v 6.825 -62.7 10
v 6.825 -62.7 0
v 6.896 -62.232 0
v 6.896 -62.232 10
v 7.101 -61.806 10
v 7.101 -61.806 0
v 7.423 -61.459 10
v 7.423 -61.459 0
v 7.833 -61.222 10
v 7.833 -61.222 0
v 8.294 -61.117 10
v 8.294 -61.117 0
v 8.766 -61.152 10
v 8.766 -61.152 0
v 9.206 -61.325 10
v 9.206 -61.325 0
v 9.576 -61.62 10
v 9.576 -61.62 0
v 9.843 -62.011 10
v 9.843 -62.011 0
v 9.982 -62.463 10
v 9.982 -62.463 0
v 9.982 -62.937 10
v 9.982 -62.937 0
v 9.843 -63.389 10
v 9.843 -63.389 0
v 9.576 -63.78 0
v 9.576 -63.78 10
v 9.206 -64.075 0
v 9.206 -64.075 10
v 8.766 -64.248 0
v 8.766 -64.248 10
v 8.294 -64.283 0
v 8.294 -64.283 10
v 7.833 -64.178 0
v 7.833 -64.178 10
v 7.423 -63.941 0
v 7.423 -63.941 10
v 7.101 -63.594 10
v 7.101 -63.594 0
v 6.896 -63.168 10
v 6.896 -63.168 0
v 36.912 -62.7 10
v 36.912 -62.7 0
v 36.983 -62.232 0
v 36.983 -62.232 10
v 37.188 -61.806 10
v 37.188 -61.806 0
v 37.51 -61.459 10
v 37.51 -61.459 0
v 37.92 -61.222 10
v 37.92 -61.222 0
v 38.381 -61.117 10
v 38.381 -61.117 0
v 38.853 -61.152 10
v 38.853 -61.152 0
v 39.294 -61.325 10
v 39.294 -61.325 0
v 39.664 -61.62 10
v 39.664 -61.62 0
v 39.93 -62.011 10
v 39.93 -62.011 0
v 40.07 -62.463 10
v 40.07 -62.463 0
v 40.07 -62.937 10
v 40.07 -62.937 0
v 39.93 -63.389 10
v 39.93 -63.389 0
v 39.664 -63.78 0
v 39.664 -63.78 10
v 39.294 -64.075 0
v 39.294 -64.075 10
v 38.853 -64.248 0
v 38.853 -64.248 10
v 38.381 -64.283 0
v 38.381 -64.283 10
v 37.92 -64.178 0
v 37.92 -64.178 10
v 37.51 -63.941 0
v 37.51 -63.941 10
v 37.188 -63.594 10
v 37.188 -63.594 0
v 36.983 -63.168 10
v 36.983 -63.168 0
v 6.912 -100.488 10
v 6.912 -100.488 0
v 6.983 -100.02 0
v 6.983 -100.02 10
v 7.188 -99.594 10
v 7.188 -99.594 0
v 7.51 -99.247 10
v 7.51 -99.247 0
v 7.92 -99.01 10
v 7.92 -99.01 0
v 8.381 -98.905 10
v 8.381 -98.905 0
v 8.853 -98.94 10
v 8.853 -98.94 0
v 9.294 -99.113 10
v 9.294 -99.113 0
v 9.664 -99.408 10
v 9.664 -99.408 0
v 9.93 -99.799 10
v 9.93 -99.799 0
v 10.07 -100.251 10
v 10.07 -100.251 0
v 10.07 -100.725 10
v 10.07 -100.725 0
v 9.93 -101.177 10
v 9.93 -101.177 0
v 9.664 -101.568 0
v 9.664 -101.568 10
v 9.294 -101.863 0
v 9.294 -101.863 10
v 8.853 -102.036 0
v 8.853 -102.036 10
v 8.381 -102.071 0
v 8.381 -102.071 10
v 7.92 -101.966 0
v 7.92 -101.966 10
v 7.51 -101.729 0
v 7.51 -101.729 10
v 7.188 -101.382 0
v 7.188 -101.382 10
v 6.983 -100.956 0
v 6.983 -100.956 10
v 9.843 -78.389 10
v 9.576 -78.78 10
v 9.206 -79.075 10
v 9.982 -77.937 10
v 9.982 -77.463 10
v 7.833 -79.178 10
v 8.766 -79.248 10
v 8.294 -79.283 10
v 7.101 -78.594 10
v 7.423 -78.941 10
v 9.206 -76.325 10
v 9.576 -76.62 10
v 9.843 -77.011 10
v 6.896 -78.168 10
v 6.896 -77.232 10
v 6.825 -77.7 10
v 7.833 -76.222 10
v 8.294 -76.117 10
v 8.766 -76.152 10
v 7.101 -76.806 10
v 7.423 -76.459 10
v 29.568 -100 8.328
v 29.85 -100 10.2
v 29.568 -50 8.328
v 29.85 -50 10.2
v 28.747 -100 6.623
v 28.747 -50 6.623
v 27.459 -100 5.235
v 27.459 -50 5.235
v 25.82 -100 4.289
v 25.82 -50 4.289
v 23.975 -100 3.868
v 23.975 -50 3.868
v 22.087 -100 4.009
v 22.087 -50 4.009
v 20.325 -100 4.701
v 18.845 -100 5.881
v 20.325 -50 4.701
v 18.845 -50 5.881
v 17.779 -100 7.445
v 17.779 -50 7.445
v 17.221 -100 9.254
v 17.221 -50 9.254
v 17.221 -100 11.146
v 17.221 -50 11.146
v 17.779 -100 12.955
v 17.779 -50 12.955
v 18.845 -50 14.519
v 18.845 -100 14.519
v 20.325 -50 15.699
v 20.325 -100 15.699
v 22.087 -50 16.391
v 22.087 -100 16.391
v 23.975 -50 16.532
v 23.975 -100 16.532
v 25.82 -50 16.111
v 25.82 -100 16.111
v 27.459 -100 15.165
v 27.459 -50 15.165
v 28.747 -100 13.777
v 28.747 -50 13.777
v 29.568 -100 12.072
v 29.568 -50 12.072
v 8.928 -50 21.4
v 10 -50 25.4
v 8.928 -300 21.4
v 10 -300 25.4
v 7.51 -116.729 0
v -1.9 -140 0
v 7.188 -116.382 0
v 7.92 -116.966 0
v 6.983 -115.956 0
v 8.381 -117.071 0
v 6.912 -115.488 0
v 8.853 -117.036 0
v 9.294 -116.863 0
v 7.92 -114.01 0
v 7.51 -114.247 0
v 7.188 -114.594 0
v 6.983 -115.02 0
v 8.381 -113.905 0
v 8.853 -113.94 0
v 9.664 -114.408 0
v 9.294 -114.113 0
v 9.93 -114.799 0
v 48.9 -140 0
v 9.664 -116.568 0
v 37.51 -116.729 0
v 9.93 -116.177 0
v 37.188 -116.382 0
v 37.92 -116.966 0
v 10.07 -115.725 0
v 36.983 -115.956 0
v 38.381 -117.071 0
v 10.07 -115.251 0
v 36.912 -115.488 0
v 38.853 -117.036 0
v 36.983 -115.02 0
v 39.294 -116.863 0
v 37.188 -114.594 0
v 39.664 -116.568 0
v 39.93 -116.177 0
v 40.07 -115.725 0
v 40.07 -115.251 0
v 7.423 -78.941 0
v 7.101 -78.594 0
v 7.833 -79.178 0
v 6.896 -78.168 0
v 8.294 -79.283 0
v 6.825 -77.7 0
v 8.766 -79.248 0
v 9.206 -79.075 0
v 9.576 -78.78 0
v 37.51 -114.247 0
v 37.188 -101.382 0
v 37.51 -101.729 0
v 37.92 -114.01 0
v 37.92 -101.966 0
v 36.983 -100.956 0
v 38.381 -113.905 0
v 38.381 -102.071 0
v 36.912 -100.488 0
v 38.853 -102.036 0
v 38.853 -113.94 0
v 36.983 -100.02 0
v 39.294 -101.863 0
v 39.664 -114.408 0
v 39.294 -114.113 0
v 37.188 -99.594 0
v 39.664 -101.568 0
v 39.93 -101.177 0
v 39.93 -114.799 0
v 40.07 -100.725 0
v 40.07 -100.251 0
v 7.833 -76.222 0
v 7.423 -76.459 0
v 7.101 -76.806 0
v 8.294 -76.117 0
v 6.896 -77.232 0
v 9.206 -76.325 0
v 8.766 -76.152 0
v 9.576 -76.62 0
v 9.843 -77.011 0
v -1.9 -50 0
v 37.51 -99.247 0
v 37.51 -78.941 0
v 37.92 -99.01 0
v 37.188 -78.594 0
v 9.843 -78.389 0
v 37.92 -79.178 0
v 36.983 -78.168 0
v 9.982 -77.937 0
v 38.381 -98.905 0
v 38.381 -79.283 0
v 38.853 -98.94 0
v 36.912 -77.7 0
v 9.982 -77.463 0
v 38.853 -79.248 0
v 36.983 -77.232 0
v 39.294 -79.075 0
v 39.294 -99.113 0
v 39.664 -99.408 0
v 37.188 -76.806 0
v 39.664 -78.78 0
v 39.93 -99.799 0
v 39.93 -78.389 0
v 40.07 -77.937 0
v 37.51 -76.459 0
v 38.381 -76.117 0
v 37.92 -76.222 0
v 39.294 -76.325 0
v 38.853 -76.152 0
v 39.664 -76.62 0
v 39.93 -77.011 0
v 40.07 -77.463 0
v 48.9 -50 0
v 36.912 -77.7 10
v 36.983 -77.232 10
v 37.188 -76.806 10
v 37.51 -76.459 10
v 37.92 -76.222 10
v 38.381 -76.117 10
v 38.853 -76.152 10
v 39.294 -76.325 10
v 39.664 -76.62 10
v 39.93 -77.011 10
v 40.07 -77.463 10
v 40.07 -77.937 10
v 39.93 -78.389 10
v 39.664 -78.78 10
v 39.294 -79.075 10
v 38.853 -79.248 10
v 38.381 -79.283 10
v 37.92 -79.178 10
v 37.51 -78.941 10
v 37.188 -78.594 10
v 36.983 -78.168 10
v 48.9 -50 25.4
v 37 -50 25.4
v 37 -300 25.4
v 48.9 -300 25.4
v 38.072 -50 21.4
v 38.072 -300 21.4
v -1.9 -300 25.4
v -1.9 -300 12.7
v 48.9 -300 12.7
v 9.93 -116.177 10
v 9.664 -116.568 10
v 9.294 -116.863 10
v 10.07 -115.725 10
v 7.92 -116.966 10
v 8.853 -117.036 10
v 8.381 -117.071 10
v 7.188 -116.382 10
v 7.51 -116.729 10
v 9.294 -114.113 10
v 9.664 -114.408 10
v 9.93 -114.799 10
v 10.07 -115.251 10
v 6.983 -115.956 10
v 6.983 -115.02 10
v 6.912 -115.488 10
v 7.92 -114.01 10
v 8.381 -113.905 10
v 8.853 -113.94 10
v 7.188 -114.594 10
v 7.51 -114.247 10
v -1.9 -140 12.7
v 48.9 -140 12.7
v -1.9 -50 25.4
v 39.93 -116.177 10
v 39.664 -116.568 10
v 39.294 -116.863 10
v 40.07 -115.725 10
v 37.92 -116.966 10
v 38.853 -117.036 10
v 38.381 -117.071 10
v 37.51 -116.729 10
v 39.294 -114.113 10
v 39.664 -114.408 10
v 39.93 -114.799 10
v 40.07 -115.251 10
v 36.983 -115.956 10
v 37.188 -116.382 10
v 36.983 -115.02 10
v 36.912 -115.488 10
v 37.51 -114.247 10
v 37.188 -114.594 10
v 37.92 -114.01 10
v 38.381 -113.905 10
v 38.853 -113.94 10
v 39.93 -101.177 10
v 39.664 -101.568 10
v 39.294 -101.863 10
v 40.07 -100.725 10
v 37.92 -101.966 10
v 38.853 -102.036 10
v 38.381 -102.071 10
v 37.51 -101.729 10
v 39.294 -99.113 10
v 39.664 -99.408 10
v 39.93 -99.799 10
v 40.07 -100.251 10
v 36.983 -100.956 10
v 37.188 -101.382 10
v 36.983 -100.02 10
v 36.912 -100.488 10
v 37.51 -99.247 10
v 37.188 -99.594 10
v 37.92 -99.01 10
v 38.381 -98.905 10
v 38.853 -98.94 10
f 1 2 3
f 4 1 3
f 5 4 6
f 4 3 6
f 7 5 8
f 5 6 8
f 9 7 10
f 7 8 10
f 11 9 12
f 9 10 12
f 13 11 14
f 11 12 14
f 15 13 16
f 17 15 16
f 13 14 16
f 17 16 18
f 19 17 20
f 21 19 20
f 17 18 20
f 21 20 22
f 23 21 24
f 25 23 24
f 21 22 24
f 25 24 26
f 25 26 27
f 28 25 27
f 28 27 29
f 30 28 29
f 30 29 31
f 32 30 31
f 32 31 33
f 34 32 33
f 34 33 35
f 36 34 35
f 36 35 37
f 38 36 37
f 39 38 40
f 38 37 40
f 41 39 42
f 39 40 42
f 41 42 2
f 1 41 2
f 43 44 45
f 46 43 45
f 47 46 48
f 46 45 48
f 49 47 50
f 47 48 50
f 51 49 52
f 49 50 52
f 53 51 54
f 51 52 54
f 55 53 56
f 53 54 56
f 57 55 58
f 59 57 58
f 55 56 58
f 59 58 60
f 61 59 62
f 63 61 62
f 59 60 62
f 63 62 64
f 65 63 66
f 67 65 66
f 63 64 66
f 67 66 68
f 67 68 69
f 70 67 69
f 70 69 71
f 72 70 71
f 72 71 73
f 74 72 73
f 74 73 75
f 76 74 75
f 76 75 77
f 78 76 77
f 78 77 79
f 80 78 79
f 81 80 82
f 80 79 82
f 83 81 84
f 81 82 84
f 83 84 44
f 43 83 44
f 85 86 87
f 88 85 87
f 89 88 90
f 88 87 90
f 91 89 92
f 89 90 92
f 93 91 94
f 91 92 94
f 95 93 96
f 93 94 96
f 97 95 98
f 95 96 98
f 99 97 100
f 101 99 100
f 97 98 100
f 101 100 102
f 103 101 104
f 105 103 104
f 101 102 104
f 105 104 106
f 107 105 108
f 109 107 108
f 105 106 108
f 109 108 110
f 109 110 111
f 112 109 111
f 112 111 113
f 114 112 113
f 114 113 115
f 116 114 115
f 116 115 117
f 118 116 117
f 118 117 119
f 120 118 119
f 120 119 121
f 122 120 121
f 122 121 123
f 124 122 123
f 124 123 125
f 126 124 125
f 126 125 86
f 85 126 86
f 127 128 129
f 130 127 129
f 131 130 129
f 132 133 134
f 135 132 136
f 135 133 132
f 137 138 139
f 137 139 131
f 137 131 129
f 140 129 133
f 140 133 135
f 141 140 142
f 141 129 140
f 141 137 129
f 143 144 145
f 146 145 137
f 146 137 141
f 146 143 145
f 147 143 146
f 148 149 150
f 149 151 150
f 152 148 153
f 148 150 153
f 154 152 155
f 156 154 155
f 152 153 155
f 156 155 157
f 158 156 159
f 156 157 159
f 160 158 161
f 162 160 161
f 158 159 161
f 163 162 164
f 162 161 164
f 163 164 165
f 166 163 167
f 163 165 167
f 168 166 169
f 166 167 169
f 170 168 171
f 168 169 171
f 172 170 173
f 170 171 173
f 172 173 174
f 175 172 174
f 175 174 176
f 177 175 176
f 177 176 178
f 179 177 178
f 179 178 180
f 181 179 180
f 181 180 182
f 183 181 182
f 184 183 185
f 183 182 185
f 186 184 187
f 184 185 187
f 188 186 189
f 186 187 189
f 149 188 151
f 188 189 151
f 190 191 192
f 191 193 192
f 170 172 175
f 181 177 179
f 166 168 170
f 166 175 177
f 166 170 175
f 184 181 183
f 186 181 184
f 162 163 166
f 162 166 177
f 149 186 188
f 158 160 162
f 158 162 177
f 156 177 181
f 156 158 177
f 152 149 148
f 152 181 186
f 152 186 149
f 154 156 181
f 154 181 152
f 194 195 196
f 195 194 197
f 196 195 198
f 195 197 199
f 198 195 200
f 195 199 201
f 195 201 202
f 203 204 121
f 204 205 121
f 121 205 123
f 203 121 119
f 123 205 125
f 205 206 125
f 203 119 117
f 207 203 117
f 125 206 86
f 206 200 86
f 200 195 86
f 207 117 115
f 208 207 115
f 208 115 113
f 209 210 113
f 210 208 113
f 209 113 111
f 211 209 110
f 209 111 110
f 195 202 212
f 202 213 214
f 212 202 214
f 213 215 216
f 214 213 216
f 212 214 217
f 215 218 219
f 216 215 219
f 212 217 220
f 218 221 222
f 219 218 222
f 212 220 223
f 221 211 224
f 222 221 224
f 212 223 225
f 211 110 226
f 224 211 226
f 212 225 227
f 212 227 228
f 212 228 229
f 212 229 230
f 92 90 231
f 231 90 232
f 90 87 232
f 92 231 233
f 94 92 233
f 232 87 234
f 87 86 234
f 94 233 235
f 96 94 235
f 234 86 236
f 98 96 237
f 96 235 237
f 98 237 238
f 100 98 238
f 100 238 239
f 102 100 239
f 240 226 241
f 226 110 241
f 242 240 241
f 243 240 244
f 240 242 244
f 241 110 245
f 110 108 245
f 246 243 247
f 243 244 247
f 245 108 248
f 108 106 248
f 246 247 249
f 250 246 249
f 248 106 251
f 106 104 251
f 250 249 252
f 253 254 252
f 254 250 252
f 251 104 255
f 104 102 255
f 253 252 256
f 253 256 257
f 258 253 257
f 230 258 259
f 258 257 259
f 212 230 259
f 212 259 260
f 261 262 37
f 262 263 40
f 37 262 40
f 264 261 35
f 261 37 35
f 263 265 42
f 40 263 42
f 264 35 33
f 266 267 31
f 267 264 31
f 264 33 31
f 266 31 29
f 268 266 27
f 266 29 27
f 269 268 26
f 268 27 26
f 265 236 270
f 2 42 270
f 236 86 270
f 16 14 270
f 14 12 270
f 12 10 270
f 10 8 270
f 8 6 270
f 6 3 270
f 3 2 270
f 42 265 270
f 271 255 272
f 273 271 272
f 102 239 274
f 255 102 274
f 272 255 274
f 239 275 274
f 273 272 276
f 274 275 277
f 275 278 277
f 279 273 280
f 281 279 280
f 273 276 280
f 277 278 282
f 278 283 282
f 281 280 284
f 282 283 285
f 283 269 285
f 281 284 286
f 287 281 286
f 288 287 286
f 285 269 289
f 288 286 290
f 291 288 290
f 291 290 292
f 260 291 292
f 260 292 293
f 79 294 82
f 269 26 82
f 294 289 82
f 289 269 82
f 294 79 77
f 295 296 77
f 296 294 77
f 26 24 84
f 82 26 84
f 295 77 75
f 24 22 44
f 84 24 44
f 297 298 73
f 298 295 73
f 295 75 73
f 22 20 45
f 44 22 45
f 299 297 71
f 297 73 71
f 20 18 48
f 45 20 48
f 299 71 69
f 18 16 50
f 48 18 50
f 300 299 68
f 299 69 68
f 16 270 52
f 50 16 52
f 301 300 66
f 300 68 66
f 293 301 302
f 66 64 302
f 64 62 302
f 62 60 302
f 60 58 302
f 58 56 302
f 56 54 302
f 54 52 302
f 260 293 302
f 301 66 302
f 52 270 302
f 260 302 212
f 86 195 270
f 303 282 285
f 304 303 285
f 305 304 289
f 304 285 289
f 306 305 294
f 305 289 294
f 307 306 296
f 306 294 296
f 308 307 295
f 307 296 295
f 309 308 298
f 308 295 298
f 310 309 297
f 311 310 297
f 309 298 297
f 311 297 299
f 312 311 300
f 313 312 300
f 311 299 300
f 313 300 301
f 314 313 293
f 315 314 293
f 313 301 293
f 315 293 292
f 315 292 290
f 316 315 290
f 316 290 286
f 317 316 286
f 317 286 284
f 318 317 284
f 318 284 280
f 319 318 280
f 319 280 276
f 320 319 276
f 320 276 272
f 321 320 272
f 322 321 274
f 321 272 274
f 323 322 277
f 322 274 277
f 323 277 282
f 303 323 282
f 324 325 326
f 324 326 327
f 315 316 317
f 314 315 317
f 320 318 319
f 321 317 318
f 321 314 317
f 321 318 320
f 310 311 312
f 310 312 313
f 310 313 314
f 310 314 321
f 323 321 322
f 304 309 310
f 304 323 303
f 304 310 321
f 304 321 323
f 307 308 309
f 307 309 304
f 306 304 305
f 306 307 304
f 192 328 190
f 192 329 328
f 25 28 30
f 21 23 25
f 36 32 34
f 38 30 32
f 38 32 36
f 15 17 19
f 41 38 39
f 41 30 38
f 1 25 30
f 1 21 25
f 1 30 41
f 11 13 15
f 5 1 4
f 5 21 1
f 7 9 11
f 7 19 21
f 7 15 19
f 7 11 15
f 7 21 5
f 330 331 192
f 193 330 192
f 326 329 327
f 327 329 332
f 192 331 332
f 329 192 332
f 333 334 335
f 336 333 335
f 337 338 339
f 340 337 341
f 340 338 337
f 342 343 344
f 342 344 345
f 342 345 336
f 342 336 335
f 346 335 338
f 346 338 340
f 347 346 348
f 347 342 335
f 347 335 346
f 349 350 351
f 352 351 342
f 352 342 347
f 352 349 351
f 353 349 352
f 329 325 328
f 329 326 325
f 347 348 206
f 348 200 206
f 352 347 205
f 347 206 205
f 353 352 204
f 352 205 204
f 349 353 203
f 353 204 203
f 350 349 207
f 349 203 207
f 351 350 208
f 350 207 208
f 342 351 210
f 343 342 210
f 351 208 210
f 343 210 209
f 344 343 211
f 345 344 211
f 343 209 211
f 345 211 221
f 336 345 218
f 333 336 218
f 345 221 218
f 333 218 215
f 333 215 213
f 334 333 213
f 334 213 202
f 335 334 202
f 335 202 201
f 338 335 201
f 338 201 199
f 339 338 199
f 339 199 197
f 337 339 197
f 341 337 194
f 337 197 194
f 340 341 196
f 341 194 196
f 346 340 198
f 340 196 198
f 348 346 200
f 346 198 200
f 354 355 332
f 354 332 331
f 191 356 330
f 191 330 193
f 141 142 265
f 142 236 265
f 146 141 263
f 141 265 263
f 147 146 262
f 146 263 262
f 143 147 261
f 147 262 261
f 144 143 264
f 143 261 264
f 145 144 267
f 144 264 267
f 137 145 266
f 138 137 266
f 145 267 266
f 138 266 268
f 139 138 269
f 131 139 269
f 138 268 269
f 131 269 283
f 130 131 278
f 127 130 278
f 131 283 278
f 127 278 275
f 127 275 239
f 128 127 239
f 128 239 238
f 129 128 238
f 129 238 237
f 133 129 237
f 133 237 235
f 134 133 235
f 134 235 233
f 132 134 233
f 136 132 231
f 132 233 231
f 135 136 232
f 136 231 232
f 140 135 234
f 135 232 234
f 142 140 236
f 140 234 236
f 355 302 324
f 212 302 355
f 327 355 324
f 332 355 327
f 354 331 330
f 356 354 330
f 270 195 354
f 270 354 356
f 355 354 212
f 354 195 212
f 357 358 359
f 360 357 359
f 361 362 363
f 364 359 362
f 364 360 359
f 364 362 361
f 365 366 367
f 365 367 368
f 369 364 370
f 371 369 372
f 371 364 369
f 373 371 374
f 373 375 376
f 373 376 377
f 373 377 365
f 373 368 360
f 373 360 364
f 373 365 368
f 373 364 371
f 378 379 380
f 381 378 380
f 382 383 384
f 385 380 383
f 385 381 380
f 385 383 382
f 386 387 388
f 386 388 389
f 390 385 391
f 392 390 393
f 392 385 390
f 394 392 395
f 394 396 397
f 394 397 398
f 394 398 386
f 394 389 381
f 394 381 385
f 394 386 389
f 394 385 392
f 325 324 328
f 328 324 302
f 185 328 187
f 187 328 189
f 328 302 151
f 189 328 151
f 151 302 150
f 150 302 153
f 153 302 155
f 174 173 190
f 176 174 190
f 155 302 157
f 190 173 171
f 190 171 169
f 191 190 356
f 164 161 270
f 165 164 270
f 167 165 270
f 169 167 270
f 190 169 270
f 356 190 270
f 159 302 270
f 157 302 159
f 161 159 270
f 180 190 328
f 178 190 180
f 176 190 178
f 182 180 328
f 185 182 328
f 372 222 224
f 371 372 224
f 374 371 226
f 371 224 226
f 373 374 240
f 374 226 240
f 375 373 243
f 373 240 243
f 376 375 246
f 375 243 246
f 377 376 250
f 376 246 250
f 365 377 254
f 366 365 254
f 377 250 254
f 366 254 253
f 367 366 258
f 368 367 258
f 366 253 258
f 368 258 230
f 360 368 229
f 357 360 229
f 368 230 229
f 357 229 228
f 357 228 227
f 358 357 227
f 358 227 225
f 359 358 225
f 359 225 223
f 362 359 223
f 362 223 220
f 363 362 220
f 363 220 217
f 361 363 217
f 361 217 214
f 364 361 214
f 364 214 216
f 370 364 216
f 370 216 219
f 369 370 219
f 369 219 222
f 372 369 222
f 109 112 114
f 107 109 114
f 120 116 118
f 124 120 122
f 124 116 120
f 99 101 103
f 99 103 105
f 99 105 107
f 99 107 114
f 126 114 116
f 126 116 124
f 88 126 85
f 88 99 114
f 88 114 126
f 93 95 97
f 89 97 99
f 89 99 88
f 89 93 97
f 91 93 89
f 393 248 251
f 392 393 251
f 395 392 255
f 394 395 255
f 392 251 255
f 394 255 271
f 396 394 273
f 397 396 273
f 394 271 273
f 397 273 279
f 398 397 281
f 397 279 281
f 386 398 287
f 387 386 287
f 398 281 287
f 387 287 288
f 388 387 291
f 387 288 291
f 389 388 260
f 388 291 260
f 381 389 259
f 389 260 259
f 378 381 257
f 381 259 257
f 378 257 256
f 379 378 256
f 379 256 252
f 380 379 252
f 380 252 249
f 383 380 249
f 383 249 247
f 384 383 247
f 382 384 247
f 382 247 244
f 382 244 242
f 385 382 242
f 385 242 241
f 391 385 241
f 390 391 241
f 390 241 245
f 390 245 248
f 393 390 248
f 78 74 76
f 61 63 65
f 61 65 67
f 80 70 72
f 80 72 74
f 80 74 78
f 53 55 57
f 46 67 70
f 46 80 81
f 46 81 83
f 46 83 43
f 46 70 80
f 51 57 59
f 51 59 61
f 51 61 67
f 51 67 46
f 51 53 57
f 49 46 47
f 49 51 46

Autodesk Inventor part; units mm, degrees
ref_plane "YZ Plane" through (0, 0, 0) normal (1, 0, 0) x (0, 1, 0)
ref_plane "XZ Plane" through (0, 0, 0) normal (0, 1, 0) x (-1, 0, 0)
ref_plane "XY Plane" through (0, 0, 0) normal (0, 0, 1) x (1, 0, 0)
sketch "Sketch1" plane through (0, 0, 0) normal (0, 0, 1) x (1, 0, 0)
  line L0 (0, 0) -> (47, 0)
  line L1 (47, 0) -> (47, -300)
  line L2 (47, -300) -> (0, -300)
  line L3 (0, -300) -> (0, 0)
  dimension "d0" = 47
  dimension "d1" = 300
extrude "Extrusion1" add sketch "Sketch1" along normal blind 25.4
sketch "Sketch2" plane through (0, -300, 0) normal (0, -1, 0) x (1, 0, 0)
  line L0 (0, 0) -> (0, 25.4) projected
  line L1 (0, 25.4) -> (47, 25.4) projected
  line L2 (0, 0) -> (10, 0)
  line L3 (10, 0) -> (10, 21.4)
  line L4 (10, 25.4) -> (0, 25.4)
  line L5 (0, 25.4) -> (0, 0)
  line L6 (0, 0) -> (47, 0) projected
  line L7 (47, 0) -> (37, 0)
  line L8 (37, 0) -> (37, 25.4)
  line L9 (37, 25.4) -> (47, 25.4)
  line L10 (47, 25.4) -> (47, 0)
  line L11 (10, 25.4) -> (3.1941, 0)
  line L12 (10, 25.4) -> (36.296, 25.4) construction
  line L13 (37, 25.4) -> (43.8059, 0)
  line L14 (37, 25.4) -> (63.296, 25.4) construction
  line L15 (37, 25.4) -> (37, 21.4)
  line L16 (37, 21.4) -> (8.9282, 21.4)
  line L17 (37, 21.4) -> (38.0718, 21.4)
  line L18 (10, 25.4) -> (37, 25.4)
  dimension "d4" = 10
  dimension "d5" = 10
  dimension "d6" = 105
  dimension "d7" = 75
  dimension "d8" = 4
extrude "Extrusion2" cut sketch "Sketch2" against normal blind 300 contours L1 L8 L16 L11 | L13 L17 L8
sketch "Sketch3" plane through (0, 0, 0) normal (0, 0, -1) x (-1, 0, 0)
  line L0 (-50.8, -30) -> (0, -30)
  line L1 (0, -30) -> (-50.8, -30)
  line L2 (0, 8.1) -> (0, -30)
  line L3 (-47, -30) -> (0, -30)
  line L4 (0, -15) -> (0, -30)
  line L5 (0, -30) -> (-47, -30)
  line L6 (-47, -30) -> (-47, -15)
  line L7 (-47, -15) -> (0, -15)
  line L8 (0, -15) -> (-47, -30) construction
  line L9 (0, -30) -> (-47, -15) construction
  line L10 (-47, 0) -> (0, 0)
  line L11 (0, 0) -> (-47, -15) construction
  line L12 (0, -15) -> (-47, 0) construction
  line L13 (-47, -15) -> (0, -15)
  line L14 (0, -15) -> (-47, -15)
  line L15 (0, 0) -> (0, -15)
  line L16 (-47, -15) -> (-47, 0)
  line L17 (-8.5, -22.5) -> (-8.5, -7.5)
  circle A0 centre (-8.5, -22.5) radius 1.5875
  circle A1 centre (-38.5, -22.5) radius 1.5875
  circle A2 centre (-38.5, -7.5) radius 1.5875
  circle A3 centre (-8.5, -7.5) radius 1.5875
  line L18 (-47, 0) -> (0, 0) projected
  line L19 (0, 0) -> (0, -122.988)
  line L20 (0, 0) -> (0, -300) projected
  line L21 (-50.8, -122.988) -> (0, -122.988)
  line L22 (0, -122.988) -> (-50.8, -122.988)
  line L23 (-47, -122.988) -> (0, -122.988)
  line L24 (0, -107.988) -> (0, -122.988)
  line L25 (0, -122.988) -> (-47, -122.988)
  line L26 (-47, -122.988) -> (-47, -107.988)
  line L27 (-47, -107.988) -> (0, -107.988)
  line L28 (0, -107.988) -> (-47, -122.988) construction
  line L29 (0, -122.988) -> (-47, -107.988) construction
  line L30 (-47, -92.988) -> (0, -92.988)
  line L31 (0, -92.988) -> (-47, -107.988) construction
  line L32 (0, -107.988) -> (-47, -92.988) construction
  line L33 (-47, -107.988) -> (0, -107.988)
  line L34 (0, -107.988) -> (-47, -107.988)
  line L35 (0, -92.988) -> (0, -107.988)
  line L36 (-47, -107.988) -> (-47, -92.988)
  line L37 (-8.5, -115.488) -> (-8.5, -100.488)
  circle A4 centre (-8.5, -115.488) radius 1.5875
  circle A5 centre (-38.5, -115.488) radius 1.5875
  circle A6 centre (-38.5, -100.488) radius 1.5875
  circle A7 centre (-8.5, -100.488) radius 1.5875
  line L38 (-16, -115.488) -> (-13.5, -115.488)
  line L39 (-13.5, -115.488) -> (-8.5, -115.488)
  line L40 (-31, -115.488) -> (-33.5, -115.488)
  line L41 (-33.5, -115.488) -> (-41, -115.488)
  line L42 (-41, -115.488) -> (-38.5, -115.488)
  point P0 (0, -6.35)
  point P1 (0, -30)
  point P2 (-27, -15)
  point P3 (-12, -15)
  point P4 (0, -15)
  point P5 (-10, 0)
  point P6 (0, -99.338)
  point P7 (-27, -107.988)
  point P8 (-12, -107.988)
  point P9 (0, -107.988)
  dimension "d11" = 15
  dimension "d12" = 15
  dimension "d13" = 3.175
  dimension "d14" = 3.175
  dimension "d15" = 3.175
  dimension "d16" = 3.175
  dimension "d17" = 122.988
  dimension "d18" = 15
  dimension "d19" = 15
  dimension "d20" = 3.175
  dimension "d21" = 3.175
  dimension "d22" = 3.175
  dimension "d23" = 3.175
  dimension "d30" = 5
  dimension "d31" = 7.5
  dimension "d32" = 2.5
extrude "Extrusion3" cut sketch "Sketch3" against normal blind 10 contours A0 | A7 | A3 | A4 L39 L37 | L37 L39 A4 | A1 | A2 | L41 A5 | A5 L41 | A6
sketch "Sketch4" plane through (0, -300, 0) normal (0, -1, 0) x (1, 0, 0)
  line L0 (0, 0) -> (47, 0) projected
  line L1 (47, 0) -> (47, 25.4) projected
  line L2 (0, 0) -> (47, 0)
  line L3 (47, 0) -> (47, 12.7)
  line L4 (47, 12.7) -> (0, 12.7)
  line L5 (0, 12.7) -> (0, 0)
  dimension "d27" = 12.7
extrude "Extrusion4" cut sketch "Sketch4" against normal blind 160
sketch "Sketch7" plane through (0, 0, 0) normal (0, 1, 0) x (1, 0, 0)
  line L0 (47, -25.4) -> (37, -25.4) projected
  line L1 (0, 0) -> (47, -25.4)
  line L2 (47, -25.4) -> (47, 0)
  line L3 (10, -25.4) -> (0, -25.4) projected
  line L4 (47, 0) -> (0, -25.4)
  circle A0 centre (23.5, -12.7) radius 6.35
  line L5 (23.5, -12.7) -> (21, -12.7)
  line L6 (0, -12.7) -> (47, -12.7) projected
  line L7 (23.5, -12.7) -> (23.5, -10.2)
  line L8 (23.5, -12.7) -> (26, -12.7) construction
  circle A1 centre (23.5, -10.2) radius 6.35
  dimension "d33" = 12.7
  dimension "d34" = 2.5
  dimension "d35" = 2.5
  dimension "d36" = 90
  dimension "d37" = 12.7
extrude "Extrusion5" cut sketch "Sketch7" against normal blind 100 contours A1 L4 A0 L1 | L1 A0 A1 | A0 L4 L1 | L1 L5 L6 A1 A0 | A1 A0 L4 | L6 A1 L1 | L1 A1 L4 | L4 A1 L6 L5 | L4 A0 A1 L6 picked at (23.5, -5.5468) picked at (27.3983, -11.8828)
sketch "Sketch9" plane through (0, 0, 0) normal (0, 0, -1) x (-1, 0, 0)
  circle A0 centre (-38.5, -22.5) radius 1.5875 projected
  circle A1 centre (-38.5, -100.488) radius 1.5875 projected
  line L0 (-38.5, -22.5) -> (-38.5, -100.488)
  line L1 (-38.5, -100.488) -> (-38.5, -62.7)
  circle A2 centre (-38.5, -115.488) radius 1.5875 projected
  line L2 (-38.5, -115.488) -> (-38.5, -77.7)
  circle A3 centre (-38.5, -62.7) radius 1.5875
  circle A4 centre (-38.5, -77.7) radius 1.5875
  line L3 (-38.5, -100.488) -> (-8.5476, -100.488)
  line L4 (-38.5, -77.7) -> (-8.4125, -77.7)
  circle A5 centre (-8.4125, -62.7) radius 1.5875
  circle A6 centre (-8.4125, -77.7) radius 1.5875
  line L5 (-10, -62.7) -> (-11.5875, -62.7)
  point P0 (0, 0)
  dimension "d40" = 37.788
  dimension "d41" = 37.788
  dimension "d42" = 3.175
  dimension "d43" = 3.175
  dimension "d44" = 3.175
  dimension "d45" = 3.175
  dimension "d59" = 1.5875
extrude "Extrusion6" cut sketch "Sketch9" against normal blind 10 contours A6 | A4 L4 L0 | L0 A4 | A3 L0 | L0 A3 | L4 A4 L0 | A5
sketch "Sketch10" plane through (0, 0, 0) normal (0, 0, -1) x (-1, 0, 0)
  line L0 (-47, -140) -> (-47, 0) projected
  line L1 (0, 0) -> (-47, 0)
  line L2 (-47, 0) -> (-47, -50)
  line L3 (-47, -50) -> (0, -50)
  line L4 (0, -50) -> (0, 0)
  point P0 (-47, 0)
  dimension "d48" = 50
extrude "Extrusion7" cut sketch "Sketch10" against normal blind 30
sketch "Sketch11" plane through (0, 0, 0) normal (0, 0, -1) x (-1, 0, 0)
  line L0 (-10, -50) -> (0, -50) projected
  line L1 (0, -50) -> (1.9, -50)
  line L2 (0, -50) -> (-47, -50) projected
  line L3 (-47, -50) -> (-48.9, -50)
  line L4 (-48.9, -50) -> (-48.9, -300)
  line L5 (-37, -300) -> (-47, -300) projected
  line L6 (-47, -300) -> (-48.9, -300)
  line L7 (-47, -300) -> (-47, -50) projected
  line L8 (-47, -50) -> (-47, -300)
  line L9 (0, -50) -> (0, -300) projected
  line L10 (0, -50) -> (0, -300)
  line L11 (0, -300) -> (0, -298.1)
  line L12 (1.9, -300) -> (0, -300)
  line L13 (1.9, -300) -> (1.9, -50)
  point P0 (0, 0)
  dimension "d51" = 1.9
  dimension "d52" = 1.9
  dimension "d53" = 1.9
extrude "Extrusion8" add sketch "Sketch11" against normal blind 25.4
sketch "Sketch12" plane through (0, 0, 0) normal (0, 0, -1) x (-1, 0, 0)
  line L0 (-37, -300) -> (-48.9, -300) projected
  line L1 (1.9, -50) -> (1.9, -300) projected
  line L2 (-48.9, -300) -> (1.9, -300)
  line L3 (1.9, -300) -> (1.9, -140)
  line L4 (1.9, -140) -> (-48.9, -140)
  line L5 (-48.9, -140) -> (-48.9, -300)
  point P0 (0, 0)
  dimension "d56" = 160
extrude "Extrusion9" cut sketch "Sketch12" against normal blind 12.7
properties part number "5211_Bias_TxRx_Relative_Dovetail_Female_MPSv2_v4" material "Polyethylene, High Density"
